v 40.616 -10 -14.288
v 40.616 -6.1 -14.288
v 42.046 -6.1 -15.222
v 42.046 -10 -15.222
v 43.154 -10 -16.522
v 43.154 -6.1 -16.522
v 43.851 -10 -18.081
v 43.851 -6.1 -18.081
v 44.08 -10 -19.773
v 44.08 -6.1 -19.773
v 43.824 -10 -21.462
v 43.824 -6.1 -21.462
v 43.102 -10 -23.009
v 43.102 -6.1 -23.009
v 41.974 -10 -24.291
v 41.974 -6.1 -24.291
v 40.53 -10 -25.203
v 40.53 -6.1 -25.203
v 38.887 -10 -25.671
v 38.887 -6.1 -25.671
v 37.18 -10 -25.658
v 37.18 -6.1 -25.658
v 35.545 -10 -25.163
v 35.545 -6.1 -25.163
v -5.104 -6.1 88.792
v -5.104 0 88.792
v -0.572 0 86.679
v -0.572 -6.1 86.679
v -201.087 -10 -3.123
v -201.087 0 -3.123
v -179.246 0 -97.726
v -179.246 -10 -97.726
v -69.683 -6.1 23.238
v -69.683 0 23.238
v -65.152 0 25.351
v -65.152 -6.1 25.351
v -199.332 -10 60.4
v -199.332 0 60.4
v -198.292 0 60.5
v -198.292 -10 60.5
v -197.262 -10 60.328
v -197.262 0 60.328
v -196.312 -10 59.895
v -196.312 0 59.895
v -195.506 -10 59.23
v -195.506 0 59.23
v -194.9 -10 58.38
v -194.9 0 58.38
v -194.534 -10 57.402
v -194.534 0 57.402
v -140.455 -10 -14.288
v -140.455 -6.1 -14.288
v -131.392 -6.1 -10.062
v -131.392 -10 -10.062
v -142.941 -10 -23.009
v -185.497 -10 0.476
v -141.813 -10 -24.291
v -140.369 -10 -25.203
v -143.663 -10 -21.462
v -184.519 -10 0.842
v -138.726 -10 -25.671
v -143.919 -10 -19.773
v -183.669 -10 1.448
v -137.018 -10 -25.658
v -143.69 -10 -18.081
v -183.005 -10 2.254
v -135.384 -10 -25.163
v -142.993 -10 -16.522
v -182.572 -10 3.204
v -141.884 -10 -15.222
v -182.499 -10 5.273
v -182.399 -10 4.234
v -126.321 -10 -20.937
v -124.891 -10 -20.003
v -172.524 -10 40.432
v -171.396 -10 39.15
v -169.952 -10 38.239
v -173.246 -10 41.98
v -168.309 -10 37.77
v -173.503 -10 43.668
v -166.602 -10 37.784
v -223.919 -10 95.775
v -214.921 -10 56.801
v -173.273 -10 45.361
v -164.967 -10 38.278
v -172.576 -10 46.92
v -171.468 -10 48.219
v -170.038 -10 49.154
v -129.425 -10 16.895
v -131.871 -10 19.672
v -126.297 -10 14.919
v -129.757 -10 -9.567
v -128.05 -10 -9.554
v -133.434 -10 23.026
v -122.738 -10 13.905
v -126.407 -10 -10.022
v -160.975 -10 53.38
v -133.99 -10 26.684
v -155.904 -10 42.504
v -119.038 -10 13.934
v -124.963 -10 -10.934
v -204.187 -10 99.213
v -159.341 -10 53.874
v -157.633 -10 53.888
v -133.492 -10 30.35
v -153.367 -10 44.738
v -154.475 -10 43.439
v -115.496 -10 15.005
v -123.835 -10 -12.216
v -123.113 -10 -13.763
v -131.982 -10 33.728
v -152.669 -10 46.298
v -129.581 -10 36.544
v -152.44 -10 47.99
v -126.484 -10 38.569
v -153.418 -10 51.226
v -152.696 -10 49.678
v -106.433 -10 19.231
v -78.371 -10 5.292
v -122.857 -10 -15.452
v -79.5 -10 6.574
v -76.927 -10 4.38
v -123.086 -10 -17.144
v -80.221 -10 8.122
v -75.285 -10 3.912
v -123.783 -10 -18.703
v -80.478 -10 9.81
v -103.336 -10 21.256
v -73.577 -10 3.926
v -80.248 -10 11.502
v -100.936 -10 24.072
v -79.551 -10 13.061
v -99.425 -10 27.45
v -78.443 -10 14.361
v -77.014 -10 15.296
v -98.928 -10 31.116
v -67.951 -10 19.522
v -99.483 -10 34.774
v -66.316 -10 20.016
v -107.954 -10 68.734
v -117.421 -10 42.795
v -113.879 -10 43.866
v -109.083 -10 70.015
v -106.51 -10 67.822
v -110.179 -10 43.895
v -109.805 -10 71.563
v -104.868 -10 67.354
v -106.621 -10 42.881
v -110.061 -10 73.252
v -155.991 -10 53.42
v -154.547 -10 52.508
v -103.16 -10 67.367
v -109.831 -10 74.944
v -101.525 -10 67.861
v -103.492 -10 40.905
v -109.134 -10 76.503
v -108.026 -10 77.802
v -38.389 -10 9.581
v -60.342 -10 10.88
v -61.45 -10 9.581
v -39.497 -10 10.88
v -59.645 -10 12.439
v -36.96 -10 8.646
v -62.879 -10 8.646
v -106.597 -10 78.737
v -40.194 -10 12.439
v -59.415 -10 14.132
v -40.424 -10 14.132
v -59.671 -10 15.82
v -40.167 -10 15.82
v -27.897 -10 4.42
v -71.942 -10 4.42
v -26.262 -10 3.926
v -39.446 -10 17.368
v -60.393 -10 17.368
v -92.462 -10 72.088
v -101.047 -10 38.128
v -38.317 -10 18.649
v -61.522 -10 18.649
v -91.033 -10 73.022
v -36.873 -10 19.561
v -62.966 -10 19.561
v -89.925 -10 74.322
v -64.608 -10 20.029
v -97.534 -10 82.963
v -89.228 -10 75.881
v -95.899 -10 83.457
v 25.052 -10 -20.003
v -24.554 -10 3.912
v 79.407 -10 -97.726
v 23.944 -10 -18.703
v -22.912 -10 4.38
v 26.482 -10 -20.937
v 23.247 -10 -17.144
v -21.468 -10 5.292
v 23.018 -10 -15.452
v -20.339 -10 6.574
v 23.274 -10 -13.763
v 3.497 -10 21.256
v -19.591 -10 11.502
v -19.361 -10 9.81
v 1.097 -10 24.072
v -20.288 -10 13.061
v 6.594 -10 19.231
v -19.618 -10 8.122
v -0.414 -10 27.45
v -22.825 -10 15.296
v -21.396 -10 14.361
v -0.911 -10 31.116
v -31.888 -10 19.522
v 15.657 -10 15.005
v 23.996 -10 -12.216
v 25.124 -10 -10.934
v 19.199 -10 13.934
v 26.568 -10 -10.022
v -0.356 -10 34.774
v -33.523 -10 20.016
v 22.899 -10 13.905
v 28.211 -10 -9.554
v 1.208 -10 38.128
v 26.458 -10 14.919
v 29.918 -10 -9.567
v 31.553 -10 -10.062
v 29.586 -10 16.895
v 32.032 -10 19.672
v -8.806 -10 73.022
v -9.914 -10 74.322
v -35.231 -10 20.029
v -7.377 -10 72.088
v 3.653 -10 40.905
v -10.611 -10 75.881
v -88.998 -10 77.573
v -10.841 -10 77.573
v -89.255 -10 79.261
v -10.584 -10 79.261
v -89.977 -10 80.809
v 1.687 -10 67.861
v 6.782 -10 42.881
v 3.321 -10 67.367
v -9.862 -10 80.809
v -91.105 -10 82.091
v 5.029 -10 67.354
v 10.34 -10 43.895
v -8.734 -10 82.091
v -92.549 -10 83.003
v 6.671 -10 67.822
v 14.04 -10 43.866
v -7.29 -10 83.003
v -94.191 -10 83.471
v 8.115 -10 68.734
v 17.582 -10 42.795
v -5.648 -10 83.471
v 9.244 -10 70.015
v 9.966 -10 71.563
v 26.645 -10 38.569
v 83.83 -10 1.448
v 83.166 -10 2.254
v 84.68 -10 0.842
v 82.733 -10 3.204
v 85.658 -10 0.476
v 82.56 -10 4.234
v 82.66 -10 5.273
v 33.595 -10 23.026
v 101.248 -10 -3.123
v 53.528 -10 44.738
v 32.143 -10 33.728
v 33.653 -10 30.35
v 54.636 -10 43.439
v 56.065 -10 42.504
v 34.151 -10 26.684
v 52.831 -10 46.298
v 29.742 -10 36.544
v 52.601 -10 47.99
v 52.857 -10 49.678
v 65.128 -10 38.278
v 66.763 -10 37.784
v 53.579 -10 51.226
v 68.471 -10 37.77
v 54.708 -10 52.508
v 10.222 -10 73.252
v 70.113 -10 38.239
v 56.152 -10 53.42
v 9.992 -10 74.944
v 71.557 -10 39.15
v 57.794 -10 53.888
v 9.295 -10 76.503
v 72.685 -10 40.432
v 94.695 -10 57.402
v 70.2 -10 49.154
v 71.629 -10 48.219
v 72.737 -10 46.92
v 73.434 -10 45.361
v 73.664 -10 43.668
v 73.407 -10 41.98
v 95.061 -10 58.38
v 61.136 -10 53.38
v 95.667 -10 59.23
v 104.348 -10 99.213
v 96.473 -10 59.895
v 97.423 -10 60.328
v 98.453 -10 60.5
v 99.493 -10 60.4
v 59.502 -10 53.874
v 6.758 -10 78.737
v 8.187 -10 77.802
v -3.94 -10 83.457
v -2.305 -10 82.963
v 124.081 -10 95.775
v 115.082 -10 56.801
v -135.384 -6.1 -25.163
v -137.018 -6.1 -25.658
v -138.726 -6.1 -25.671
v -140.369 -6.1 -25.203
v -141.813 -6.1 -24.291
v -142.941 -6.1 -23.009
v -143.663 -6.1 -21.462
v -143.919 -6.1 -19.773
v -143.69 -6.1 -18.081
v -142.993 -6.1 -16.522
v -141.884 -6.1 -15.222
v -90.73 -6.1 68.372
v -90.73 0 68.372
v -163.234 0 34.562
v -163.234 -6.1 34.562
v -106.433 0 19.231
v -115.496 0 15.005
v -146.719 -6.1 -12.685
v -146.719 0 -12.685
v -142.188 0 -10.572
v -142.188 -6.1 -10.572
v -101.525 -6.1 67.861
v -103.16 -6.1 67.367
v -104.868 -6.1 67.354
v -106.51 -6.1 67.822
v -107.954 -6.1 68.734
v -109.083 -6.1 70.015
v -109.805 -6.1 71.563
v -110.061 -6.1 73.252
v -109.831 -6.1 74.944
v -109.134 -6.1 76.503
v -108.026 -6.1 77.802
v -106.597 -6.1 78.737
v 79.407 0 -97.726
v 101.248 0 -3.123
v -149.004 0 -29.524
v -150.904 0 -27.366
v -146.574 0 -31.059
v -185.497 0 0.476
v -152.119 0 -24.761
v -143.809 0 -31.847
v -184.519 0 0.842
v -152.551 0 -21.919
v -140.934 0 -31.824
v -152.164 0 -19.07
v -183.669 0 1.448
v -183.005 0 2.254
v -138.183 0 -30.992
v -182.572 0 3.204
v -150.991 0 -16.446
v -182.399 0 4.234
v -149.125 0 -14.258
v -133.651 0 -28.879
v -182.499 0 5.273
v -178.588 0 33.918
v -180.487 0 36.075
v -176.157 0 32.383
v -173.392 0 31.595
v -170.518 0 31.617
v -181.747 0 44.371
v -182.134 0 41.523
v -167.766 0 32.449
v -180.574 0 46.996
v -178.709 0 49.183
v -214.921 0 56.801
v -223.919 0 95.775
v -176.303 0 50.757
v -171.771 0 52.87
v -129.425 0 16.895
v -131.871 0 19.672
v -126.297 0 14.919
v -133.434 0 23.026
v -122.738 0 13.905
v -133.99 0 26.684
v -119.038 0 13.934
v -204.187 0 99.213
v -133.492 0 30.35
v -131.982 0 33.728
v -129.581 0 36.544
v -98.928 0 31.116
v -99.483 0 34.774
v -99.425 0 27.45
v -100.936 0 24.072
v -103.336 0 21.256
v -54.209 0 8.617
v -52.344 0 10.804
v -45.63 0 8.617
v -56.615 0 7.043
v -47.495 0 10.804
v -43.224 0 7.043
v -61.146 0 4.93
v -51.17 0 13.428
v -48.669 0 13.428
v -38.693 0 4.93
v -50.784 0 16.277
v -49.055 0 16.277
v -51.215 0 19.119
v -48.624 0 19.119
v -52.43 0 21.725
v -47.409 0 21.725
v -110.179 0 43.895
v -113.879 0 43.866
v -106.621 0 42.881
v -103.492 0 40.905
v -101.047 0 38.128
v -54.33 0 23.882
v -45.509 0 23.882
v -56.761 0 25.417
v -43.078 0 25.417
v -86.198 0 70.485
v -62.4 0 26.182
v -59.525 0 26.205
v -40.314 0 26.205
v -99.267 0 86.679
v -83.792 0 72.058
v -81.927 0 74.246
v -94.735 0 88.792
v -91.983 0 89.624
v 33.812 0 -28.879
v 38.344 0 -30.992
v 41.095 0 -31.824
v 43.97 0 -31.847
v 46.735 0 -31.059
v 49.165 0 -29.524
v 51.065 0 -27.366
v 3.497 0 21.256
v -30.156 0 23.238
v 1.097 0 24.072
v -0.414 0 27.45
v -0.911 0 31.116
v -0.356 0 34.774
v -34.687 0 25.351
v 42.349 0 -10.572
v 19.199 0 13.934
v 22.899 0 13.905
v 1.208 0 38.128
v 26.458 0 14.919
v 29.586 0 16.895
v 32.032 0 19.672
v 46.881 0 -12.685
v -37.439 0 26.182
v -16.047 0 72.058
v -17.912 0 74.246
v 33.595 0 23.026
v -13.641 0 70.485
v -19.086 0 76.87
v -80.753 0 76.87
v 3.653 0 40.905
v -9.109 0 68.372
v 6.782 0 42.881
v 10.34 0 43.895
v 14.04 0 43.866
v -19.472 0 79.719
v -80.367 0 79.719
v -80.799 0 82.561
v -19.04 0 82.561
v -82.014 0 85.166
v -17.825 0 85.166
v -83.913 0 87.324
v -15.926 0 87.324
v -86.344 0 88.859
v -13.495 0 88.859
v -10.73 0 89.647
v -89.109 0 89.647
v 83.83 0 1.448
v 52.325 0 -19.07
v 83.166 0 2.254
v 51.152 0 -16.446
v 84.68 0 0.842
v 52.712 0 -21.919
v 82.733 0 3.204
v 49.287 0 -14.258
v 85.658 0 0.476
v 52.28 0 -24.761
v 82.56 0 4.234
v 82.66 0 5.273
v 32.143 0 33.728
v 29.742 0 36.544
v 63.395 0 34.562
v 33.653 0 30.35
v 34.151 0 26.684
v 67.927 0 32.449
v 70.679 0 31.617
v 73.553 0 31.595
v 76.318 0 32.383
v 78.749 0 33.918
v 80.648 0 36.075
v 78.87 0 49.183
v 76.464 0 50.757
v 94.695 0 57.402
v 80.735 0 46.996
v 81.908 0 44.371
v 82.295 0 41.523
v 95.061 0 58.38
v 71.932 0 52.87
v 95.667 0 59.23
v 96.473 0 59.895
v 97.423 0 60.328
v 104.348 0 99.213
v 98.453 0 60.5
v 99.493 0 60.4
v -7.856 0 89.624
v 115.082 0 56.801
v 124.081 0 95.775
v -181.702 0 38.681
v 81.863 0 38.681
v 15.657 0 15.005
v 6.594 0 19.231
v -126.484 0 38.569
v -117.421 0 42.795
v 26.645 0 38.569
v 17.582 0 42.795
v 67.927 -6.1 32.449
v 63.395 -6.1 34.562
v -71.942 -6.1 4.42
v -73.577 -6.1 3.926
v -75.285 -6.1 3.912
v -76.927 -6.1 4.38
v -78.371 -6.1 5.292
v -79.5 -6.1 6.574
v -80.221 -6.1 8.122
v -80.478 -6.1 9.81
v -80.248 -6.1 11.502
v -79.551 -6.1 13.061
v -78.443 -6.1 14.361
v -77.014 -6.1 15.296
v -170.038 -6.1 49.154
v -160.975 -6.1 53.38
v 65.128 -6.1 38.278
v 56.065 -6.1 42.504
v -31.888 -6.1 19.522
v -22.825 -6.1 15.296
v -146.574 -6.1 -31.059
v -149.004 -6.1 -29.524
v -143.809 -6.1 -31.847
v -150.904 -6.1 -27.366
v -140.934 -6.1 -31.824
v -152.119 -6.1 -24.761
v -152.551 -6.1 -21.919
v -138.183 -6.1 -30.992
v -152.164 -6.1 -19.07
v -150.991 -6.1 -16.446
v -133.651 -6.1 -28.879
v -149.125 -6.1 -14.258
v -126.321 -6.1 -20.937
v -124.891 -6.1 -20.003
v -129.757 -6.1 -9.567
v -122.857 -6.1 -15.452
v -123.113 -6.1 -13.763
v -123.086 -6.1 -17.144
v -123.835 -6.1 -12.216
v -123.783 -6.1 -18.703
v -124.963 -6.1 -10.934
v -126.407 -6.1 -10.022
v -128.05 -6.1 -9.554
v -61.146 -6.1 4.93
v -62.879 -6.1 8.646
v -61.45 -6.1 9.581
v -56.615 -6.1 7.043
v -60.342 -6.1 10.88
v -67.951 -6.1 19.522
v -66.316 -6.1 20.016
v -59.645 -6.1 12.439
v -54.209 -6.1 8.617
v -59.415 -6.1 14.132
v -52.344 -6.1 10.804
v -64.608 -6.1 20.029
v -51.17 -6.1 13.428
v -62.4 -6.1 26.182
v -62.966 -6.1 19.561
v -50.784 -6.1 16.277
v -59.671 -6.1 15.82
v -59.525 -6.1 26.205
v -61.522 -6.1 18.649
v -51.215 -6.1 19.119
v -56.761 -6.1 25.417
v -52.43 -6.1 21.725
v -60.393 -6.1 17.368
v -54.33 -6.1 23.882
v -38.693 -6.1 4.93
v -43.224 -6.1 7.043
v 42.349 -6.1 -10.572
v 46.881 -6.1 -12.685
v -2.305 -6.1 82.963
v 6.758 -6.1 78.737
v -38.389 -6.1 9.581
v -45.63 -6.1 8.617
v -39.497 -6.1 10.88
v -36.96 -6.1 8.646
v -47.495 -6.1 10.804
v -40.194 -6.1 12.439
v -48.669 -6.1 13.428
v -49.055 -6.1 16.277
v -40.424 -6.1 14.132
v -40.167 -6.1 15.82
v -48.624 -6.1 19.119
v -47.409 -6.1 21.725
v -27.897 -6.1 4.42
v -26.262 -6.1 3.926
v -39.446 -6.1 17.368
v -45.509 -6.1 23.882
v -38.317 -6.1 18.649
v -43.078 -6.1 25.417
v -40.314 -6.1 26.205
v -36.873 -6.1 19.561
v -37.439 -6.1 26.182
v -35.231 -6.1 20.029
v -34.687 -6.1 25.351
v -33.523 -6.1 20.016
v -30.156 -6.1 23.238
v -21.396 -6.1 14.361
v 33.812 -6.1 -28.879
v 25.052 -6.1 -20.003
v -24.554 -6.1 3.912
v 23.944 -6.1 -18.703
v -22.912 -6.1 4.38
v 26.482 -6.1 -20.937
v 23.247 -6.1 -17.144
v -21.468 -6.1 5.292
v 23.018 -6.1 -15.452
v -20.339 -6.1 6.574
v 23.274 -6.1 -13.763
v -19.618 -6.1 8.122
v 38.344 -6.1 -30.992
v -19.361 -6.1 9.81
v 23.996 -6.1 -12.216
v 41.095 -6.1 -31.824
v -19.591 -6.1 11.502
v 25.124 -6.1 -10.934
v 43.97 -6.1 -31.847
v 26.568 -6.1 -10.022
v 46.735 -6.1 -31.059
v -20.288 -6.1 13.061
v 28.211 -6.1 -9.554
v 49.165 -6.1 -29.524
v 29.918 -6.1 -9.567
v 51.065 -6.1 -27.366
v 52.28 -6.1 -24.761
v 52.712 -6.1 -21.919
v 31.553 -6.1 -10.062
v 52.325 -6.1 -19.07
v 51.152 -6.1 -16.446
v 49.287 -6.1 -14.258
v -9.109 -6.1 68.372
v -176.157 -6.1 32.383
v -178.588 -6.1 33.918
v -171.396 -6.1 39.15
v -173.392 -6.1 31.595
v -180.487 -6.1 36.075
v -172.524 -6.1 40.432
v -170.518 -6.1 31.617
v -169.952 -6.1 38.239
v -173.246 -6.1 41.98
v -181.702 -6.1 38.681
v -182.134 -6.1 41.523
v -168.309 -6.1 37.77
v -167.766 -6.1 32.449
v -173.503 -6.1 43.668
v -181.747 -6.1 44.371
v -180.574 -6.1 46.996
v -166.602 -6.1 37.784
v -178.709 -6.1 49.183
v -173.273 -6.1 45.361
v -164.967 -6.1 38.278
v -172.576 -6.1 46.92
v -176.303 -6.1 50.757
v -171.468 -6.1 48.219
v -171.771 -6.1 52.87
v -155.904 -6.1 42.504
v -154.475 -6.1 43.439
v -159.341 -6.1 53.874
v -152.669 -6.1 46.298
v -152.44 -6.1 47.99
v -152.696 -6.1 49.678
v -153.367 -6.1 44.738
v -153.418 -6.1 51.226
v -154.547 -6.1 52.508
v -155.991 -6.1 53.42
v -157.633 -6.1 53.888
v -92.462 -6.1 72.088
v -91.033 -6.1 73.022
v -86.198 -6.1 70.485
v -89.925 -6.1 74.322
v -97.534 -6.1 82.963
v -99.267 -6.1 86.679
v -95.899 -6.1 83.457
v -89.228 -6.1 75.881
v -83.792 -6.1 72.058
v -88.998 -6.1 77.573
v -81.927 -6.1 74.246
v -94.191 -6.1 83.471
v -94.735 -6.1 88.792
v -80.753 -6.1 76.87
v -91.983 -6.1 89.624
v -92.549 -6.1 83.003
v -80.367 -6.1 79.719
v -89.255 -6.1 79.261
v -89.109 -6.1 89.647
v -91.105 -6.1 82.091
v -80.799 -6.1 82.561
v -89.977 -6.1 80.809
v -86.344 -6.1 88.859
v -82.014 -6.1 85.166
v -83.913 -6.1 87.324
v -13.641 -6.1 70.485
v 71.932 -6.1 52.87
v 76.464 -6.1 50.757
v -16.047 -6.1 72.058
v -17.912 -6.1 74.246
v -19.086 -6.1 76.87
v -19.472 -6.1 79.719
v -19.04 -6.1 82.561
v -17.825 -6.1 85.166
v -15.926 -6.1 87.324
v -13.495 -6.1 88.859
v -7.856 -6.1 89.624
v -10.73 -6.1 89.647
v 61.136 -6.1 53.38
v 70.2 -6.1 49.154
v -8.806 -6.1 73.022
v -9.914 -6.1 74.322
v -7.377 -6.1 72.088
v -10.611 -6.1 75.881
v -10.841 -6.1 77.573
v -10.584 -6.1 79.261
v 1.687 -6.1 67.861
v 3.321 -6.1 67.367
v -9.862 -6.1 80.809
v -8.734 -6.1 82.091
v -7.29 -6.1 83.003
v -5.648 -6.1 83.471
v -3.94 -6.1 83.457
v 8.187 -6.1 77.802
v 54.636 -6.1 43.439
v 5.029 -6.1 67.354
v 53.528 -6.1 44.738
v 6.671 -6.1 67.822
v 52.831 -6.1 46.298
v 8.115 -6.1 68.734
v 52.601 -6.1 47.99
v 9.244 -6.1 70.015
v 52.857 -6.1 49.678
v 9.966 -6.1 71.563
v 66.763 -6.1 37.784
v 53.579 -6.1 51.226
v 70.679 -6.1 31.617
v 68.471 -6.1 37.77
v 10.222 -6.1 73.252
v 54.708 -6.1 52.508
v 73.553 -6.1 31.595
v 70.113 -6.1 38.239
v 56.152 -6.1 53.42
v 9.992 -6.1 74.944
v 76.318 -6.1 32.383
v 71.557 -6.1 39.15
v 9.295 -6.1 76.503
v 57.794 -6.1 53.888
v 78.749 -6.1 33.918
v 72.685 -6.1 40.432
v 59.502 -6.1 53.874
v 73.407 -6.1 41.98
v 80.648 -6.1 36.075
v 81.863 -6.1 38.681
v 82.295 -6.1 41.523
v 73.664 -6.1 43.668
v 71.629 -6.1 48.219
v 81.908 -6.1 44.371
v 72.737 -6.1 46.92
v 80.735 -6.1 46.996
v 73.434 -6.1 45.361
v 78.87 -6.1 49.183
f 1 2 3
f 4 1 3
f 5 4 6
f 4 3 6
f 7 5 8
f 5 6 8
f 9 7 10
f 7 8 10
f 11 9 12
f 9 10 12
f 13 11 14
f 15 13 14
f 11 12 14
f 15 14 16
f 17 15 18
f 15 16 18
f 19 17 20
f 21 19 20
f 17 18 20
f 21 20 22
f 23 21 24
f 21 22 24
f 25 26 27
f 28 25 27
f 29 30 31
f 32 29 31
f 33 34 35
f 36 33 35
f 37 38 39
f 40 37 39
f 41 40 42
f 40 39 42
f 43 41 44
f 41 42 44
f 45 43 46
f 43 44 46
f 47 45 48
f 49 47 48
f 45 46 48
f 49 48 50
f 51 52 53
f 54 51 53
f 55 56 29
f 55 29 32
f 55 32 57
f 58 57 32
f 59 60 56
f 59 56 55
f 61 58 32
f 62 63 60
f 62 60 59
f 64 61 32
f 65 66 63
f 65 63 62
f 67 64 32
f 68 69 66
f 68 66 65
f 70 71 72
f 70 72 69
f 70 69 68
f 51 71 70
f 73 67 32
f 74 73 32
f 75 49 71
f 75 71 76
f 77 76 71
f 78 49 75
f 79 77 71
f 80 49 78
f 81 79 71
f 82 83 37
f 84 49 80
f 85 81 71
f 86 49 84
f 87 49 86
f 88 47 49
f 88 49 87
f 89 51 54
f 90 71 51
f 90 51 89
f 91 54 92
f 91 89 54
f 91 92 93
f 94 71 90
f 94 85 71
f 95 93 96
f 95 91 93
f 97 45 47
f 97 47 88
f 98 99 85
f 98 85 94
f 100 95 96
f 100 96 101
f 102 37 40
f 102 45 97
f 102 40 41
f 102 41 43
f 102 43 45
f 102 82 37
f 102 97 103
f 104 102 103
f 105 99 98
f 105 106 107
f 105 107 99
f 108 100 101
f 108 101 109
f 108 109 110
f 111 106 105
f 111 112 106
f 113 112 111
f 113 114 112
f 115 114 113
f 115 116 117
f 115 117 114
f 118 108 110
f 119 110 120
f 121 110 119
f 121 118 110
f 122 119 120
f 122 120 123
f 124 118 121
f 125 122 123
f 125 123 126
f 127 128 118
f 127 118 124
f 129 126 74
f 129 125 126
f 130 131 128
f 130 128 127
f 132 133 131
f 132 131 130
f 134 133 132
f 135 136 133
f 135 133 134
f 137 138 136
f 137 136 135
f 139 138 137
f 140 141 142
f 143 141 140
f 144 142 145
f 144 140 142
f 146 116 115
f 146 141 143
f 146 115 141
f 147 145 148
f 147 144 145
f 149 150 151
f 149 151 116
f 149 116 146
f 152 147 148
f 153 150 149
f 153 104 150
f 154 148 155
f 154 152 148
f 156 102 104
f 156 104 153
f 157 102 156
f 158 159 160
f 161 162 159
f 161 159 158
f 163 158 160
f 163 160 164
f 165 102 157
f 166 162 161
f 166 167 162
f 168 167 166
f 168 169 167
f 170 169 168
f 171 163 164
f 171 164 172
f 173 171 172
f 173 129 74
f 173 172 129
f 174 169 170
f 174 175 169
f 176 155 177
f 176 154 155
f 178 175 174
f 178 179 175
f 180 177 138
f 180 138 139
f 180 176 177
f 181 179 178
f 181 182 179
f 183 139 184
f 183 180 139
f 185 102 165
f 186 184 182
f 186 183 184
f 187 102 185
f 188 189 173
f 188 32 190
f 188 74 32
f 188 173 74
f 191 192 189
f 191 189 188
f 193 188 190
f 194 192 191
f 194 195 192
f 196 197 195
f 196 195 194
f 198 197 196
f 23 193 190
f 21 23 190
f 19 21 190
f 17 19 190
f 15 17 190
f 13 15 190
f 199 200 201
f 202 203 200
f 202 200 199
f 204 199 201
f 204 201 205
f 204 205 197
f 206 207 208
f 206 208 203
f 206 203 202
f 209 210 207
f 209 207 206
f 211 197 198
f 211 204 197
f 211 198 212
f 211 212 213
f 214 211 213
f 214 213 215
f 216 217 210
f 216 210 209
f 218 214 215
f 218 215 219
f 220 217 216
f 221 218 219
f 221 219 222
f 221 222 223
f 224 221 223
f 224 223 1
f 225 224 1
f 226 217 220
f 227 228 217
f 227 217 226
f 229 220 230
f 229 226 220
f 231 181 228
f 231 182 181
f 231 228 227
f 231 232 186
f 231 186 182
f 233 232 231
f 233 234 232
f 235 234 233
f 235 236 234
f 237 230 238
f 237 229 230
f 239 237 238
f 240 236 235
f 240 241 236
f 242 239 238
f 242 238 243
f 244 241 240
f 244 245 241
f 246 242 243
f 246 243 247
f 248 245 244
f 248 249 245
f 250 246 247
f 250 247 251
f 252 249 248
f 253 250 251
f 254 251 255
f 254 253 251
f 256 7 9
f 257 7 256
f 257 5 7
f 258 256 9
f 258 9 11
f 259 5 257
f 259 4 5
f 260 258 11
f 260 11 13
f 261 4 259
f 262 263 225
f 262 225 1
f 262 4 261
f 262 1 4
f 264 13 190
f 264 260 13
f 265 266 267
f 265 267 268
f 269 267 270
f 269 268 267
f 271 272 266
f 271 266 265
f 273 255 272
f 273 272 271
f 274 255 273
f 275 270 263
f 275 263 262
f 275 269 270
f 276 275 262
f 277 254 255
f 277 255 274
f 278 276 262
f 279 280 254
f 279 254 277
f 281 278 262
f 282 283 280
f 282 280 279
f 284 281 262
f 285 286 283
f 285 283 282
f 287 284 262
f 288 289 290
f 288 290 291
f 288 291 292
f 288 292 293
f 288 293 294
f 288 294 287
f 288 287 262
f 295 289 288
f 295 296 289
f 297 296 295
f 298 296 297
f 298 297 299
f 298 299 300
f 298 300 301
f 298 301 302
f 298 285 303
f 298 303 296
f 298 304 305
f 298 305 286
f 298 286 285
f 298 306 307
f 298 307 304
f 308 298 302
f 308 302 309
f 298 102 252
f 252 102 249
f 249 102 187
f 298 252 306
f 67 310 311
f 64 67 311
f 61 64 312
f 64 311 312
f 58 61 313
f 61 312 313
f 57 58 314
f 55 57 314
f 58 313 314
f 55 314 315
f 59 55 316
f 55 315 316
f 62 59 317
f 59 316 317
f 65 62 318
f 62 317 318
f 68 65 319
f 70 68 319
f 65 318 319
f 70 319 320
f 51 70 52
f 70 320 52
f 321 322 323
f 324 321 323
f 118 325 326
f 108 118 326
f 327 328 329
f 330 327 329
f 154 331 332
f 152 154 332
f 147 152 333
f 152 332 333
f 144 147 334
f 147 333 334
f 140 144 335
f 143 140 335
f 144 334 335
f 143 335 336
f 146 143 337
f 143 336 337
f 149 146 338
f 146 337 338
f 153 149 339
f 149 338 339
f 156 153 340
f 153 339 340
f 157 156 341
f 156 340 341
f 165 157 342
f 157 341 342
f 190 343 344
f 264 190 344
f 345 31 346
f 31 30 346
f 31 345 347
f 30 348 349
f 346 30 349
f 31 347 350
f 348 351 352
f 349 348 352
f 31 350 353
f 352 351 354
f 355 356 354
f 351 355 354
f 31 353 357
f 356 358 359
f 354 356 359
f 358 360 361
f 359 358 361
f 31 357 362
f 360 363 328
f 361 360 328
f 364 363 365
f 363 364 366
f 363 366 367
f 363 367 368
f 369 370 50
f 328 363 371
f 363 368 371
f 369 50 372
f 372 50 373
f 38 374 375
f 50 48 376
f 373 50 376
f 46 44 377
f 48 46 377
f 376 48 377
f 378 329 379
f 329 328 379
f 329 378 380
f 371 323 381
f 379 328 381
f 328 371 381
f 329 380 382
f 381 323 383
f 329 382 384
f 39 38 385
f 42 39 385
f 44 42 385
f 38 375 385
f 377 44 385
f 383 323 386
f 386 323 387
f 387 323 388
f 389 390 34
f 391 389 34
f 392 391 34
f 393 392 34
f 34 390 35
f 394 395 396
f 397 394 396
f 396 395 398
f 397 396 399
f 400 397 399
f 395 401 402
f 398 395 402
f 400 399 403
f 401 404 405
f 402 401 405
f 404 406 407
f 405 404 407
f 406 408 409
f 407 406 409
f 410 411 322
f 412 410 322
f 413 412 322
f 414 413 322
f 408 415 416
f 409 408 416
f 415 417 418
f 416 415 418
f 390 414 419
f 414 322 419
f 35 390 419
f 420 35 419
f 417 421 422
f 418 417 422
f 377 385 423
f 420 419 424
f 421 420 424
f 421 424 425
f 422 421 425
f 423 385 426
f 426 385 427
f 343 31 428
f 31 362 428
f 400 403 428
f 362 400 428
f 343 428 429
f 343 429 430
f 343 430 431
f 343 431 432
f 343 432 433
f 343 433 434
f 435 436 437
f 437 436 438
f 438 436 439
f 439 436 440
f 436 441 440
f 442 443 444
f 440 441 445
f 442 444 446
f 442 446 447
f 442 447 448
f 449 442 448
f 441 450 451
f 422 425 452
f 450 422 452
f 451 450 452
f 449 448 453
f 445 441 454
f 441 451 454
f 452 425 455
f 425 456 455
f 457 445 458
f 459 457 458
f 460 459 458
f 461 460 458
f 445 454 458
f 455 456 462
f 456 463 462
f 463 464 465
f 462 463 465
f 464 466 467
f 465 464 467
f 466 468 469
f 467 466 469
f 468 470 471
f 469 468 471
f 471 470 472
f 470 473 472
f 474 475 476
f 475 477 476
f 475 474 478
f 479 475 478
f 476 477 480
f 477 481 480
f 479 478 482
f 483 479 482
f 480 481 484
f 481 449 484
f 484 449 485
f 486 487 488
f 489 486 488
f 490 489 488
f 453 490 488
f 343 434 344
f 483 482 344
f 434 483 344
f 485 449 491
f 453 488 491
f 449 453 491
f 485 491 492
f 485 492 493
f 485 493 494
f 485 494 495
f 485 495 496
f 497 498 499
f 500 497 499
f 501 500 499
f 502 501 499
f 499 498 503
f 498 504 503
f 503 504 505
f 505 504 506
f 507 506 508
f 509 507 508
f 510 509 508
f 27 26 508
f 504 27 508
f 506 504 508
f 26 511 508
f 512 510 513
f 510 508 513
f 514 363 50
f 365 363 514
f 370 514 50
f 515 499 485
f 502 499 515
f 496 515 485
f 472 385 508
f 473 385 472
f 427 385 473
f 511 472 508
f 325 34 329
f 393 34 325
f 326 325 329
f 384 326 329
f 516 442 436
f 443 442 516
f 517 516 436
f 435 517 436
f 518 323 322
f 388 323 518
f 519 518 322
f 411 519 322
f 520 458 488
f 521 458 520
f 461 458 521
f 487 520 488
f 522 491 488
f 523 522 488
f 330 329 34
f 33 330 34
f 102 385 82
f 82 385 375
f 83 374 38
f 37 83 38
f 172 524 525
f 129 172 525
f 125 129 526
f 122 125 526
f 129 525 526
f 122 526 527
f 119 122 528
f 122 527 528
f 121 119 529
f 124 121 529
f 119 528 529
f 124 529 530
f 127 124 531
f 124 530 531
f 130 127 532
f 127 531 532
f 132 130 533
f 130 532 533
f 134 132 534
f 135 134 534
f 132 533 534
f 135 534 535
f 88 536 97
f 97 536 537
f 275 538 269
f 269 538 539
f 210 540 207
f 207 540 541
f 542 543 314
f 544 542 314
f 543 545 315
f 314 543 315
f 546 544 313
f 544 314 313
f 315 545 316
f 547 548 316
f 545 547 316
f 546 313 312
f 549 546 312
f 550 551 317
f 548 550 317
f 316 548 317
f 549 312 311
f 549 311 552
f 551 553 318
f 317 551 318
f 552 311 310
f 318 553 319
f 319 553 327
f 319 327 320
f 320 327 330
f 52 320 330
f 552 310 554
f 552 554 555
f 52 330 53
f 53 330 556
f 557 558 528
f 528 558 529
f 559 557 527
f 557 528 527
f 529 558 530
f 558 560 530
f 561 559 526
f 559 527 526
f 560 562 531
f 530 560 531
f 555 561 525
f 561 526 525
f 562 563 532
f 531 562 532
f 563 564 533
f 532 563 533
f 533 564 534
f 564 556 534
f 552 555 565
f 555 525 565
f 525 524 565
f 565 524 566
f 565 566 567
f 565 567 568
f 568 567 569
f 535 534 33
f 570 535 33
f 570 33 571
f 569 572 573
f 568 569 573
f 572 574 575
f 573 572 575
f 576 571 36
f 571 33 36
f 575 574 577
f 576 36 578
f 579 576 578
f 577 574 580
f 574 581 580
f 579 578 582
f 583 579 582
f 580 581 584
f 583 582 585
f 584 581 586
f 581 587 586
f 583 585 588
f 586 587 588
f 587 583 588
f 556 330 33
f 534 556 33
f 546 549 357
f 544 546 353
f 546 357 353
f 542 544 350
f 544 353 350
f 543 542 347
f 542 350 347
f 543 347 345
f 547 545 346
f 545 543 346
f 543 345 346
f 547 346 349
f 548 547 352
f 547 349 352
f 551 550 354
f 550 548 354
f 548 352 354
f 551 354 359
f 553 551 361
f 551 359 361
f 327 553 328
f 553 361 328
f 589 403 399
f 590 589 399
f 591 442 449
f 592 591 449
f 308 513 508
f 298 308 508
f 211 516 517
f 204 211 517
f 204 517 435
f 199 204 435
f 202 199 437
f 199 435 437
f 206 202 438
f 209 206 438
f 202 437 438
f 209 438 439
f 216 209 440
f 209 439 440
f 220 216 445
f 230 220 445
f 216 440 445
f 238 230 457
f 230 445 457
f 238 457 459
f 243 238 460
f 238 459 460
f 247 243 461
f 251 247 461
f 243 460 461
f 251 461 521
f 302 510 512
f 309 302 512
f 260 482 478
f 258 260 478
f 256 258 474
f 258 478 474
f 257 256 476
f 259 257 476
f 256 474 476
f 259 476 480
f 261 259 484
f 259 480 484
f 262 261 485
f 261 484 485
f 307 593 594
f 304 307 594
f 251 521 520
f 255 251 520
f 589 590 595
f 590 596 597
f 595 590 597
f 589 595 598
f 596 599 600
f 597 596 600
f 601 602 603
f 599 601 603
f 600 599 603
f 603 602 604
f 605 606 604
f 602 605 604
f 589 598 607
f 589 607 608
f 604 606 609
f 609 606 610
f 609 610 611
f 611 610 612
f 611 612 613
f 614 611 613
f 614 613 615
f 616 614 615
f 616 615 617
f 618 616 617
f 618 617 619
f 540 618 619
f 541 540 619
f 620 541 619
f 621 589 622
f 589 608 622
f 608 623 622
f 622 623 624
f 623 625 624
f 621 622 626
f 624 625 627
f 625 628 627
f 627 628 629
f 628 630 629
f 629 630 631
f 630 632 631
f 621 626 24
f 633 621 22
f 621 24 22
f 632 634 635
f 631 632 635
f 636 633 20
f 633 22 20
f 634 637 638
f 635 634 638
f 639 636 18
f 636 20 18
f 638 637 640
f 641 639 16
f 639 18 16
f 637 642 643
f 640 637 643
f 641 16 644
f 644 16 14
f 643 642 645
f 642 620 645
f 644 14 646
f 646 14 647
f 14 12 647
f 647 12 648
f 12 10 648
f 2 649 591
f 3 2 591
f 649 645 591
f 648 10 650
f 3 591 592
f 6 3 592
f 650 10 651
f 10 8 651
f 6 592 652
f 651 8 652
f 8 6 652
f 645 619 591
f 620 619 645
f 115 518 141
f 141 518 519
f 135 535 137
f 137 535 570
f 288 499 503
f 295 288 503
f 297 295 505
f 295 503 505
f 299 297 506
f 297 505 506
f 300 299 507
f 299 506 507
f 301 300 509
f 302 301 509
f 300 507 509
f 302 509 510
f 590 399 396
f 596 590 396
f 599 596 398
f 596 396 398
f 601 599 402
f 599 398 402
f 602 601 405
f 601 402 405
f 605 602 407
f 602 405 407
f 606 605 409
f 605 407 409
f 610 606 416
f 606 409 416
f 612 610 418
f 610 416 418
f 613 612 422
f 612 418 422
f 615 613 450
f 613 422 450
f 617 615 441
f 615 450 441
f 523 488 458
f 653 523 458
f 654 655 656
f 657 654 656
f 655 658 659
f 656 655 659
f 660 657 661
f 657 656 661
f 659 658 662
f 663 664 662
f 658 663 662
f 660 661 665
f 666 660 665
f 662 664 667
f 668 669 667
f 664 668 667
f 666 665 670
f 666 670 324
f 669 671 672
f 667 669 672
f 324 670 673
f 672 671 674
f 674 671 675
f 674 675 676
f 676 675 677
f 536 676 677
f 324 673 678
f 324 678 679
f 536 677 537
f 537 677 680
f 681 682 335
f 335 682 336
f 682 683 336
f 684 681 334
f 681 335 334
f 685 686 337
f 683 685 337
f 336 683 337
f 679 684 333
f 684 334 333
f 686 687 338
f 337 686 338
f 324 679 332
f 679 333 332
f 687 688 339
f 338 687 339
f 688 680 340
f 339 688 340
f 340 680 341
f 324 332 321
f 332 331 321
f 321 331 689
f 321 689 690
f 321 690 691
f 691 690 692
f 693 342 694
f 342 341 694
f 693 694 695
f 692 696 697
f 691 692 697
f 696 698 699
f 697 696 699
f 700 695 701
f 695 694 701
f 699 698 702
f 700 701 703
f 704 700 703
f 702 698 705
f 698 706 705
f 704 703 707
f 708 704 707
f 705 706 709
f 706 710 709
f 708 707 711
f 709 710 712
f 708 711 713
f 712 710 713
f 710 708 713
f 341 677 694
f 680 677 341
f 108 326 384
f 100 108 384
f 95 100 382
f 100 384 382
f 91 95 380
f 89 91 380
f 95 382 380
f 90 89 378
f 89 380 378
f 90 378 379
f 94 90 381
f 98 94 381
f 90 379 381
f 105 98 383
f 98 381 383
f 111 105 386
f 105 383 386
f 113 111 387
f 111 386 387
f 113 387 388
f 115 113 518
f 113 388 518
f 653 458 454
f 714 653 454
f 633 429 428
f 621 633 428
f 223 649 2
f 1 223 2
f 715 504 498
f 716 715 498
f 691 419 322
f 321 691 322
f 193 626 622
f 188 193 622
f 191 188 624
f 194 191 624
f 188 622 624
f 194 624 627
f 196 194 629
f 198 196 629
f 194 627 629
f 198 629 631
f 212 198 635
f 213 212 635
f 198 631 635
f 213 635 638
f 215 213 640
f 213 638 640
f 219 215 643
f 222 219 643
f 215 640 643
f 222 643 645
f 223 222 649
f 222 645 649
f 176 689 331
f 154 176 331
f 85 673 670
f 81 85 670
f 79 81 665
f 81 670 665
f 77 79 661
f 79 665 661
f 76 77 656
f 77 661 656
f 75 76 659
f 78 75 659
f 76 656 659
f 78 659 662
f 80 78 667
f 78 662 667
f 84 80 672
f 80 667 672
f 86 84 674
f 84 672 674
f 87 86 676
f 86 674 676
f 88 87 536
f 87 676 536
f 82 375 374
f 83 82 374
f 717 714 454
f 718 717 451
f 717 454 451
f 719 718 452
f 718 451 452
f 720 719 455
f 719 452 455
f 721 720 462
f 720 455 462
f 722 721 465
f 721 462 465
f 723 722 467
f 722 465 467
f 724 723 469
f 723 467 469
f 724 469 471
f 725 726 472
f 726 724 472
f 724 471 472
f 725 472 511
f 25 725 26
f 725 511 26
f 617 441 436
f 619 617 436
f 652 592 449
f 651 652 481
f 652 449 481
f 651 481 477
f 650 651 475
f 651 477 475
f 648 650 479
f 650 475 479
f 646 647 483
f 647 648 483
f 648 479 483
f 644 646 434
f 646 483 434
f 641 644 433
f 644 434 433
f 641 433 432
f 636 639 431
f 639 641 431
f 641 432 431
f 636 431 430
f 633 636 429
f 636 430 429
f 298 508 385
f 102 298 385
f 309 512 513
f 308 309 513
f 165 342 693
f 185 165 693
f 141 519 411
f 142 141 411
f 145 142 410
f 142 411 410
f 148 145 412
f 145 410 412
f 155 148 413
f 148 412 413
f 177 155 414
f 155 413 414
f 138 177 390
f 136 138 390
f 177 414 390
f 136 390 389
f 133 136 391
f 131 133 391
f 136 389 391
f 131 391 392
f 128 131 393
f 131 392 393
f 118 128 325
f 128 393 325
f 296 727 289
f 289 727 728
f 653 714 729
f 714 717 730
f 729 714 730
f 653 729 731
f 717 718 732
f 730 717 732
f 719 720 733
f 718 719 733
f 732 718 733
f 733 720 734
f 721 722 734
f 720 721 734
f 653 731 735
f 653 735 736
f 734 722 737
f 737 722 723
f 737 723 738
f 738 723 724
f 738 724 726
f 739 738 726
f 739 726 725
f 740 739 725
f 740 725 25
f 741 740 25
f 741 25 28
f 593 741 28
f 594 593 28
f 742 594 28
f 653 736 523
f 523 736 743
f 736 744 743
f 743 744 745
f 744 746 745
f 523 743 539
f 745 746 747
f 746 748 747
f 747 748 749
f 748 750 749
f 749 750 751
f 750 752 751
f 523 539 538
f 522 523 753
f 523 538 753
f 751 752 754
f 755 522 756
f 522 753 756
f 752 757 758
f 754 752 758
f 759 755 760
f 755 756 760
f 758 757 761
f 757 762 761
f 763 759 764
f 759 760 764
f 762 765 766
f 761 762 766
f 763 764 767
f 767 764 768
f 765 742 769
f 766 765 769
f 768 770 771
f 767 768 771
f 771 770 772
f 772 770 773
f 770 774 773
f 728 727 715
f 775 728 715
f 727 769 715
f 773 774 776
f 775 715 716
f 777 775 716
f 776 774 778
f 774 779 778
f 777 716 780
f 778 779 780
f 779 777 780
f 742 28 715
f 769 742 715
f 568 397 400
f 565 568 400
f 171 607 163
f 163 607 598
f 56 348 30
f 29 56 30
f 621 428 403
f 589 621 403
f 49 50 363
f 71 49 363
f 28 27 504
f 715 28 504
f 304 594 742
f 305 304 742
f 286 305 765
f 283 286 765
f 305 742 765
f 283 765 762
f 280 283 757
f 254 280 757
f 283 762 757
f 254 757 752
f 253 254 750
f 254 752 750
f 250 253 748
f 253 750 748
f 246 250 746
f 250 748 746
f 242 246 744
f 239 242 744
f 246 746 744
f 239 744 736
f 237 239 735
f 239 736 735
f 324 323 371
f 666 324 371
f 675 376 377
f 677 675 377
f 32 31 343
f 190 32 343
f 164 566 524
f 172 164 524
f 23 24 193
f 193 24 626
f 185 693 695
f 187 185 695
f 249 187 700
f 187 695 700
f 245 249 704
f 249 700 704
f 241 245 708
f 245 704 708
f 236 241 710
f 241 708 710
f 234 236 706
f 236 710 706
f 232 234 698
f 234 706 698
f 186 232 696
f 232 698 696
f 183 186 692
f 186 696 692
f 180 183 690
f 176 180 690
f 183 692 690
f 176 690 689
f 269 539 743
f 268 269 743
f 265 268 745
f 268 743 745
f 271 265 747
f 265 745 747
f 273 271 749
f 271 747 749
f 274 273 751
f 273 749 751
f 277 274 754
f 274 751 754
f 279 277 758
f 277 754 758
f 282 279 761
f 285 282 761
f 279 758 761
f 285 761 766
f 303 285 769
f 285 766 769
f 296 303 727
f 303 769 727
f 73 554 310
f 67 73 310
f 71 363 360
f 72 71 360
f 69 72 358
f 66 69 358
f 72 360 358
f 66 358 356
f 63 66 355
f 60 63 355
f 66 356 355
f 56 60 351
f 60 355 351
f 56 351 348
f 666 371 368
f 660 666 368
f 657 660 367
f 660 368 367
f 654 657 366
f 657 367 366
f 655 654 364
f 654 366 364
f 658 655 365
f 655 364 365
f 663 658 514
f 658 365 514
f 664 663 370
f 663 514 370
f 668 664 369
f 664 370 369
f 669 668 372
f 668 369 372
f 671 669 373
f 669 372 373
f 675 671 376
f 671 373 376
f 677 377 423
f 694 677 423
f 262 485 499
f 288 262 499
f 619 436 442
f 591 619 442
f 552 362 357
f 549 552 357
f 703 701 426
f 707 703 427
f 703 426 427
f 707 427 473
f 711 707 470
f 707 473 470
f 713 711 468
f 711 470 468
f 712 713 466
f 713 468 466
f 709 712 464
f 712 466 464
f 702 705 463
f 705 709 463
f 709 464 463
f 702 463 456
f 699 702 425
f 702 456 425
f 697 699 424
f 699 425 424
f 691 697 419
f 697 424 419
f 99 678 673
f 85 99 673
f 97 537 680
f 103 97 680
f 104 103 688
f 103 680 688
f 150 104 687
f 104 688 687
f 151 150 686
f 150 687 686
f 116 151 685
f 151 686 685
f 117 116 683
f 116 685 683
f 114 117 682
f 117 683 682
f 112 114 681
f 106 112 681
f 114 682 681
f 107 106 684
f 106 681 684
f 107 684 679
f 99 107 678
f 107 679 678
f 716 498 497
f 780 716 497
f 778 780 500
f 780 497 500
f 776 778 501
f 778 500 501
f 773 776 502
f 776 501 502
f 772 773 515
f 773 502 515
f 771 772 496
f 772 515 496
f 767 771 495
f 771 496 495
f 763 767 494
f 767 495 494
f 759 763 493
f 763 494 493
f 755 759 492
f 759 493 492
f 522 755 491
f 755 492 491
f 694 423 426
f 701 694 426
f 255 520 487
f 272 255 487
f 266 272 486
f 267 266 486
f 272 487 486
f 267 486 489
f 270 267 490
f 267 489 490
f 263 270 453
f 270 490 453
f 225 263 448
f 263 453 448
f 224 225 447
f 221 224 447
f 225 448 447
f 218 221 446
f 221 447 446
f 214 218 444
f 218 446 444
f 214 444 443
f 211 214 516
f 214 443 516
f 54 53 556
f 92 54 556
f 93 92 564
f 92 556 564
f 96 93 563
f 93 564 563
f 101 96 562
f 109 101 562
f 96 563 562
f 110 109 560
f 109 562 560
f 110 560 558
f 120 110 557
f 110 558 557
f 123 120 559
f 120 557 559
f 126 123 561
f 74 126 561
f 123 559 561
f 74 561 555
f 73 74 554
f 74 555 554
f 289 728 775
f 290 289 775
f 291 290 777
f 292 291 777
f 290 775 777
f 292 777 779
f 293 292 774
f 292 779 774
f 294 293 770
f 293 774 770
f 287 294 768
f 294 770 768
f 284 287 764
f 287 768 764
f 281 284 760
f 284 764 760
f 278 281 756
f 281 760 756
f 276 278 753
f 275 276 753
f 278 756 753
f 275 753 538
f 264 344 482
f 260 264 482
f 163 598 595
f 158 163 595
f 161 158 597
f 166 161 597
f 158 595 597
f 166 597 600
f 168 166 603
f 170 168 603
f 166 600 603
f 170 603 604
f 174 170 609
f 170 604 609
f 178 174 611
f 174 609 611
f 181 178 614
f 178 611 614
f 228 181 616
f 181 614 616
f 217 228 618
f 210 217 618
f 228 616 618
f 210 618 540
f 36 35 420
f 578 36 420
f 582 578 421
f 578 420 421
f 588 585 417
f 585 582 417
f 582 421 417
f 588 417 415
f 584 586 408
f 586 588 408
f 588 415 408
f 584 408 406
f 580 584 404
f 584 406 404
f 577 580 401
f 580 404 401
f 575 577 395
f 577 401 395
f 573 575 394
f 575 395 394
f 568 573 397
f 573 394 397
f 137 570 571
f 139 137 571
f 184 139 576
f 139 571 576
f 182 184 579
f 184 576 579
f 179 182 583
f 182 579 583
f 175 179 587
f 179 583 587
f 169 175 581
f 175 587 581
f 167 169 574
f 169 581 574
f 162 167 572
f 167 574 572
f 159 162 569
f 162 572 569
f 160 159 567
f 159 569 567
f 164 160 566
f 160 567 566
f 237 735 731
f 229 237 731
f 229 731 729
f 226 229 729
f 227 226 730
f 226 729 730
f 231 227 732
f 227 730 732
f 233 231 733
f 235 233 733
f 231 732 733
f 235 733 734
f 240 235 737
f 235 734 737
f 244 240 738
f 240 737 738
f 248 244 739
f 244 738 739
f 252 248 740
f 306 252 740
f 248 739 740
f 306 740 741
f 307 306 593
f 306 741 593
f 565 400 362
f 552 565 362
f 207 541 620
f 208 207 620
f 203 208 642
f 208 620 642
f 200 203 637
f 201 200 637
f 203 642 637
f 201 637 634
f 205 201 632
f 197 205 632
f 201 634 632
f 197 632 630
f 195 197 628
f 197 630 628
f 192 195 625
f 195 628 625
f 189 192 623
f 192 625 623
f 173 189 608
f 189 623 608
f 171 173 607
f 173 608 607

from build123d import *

# Parameters (mm, degrees)
F1_DEPTH = 10
F2_START = 6.1
F2_DEPTH = 3.9


with BuildPart() as f1:
    # F0 (on Front) → F1 (new body)
    with BuildSketch(Plane.XZ):
        with BuildLine():
            Line((-10.0713614853, 99.2132068528), (-89.767584656, 99.2132068528))
            Line((-89.767584656, 99.2132068528), (-204.1870618351, 99.2132068528))
            Line((-204.1870618351, 99.2132068528), (-223.9194730707, 95.7754404094))
            Line((-223.9194730707, 95.7754404094), (-214.9214308969, 56.800637818))
            Line((-214.9214308969, 56.800637818), (-199.3315098604, 60.3998546875))
            ThreePointArc((-199.3315098604, 60.3998546875), (-196.3120285861, 59.8945668129), (-194.5342253839, 57.4021786457))
            Line((-194.5342253839, 57.4021786457), (-182.4993439765, 5.2733801797))
            ThreePointArc((-182.4993439765, 5.2733801797), (-183.004631851, 2.2538989054), (-185.4970200182, 0.4760957032))
            Line((-185.4970200182, 0.4760957032), (-201.0869410548, -3.1231211663))
            Line((-201.0869410548, -3.1231211663), (-179.246252088, -97.7255385038))
            Line((-179.246252088, -97.7255385038), (-49.9194730707, -97.7255385038))
            Line((-49.9194730707, -97.7255385038), (79.4073059466, -97.7255385038))
            Line((79.4073059466, -97.7255385038), (101.2479949134, -3.1231211663))
            Line((101.2479949134, -3.1231211663), (85.6580738768, 0.4760957032))
            ThreePointArc((85.6580738768, 0.4760957032), (83.1656857096, 2.2538989054), (82.6603978351, 5.2733801797))
            Line((82.6603978351, 5.2733801797), (94.6952792425, 57.4021786457))
            ThreePointArc((94.6952792425, 57.4021786457), (96.4730824447, 59.8945668129), (99.492563719, 60.3998546875))
            Line((99.492563719, 60.3998546875), (115.0824847556, 56.800637818))
            Line((115.0824847556, 56.800637818), (124.0805269293, 95.7754404094))
            Line((124.0805269293, 95.7754404094), (104.3481156937, 99.2132068528))
            Line((104.3481156937, 99.2132068528), (-10.0713614853, 99.2132068528))
        make_face()
        with BuildLine():
            Line((-146.7194564495, -12.6849211634), (-142.1879175143, -10.5718298547))
            Line((-142.1879175143, -10.5718298547), (-69.6832945513, 23.2376310846))
            Line((-69.6832945513, 23.2376310846), (-65.1517556162, 25.3507223933))
            ThreePointArc((-65.1517556162, 25.3507223933), (-51.7296025235, 20.4654581878), (-56.614866729, 7.0433050951))
            Line((-56.614866729, 7.0433050951), (-61.1464056642, 4.9302137864))
            Line((-61.1464056642, 4.9302137864), (-133.6510286271, -28.8792471528))
            Line((-133.6510286271, -28.8792471528), (-138.1825675623, -30.9923384615))
            ThreePointArc((-138.1825675623, -30.9923384615), (-151.6047206549, -26.107074256), (-146.7194564495, -12.6849211634))
        make_face(mode=Mode.SUBTRACT)
        with BuildLine():
            Line((38.3436214209, -30.9923384615), (33.8120824857, -28.8792471528))
            Line((33.8120824857, -28.8792471528), (-38.6925404772, 4.9302137864))
            Line((-38.6925404772, 4.9302137864), (-43.2240794124, 7.0433050951))
            ThreePointArc((-43.2240794124, 7.0433050951), (-48.1093436179, 20.4654581878), (-34.6871905252, 25.3507223933))
            Line((-34.6871905252, 25.3507223933), (-30.15565159, 23.2376310846))
            Line((-30.15565159, 23.2376310846), (42.3489713729, -10.5718298547))
            Line((42.3489713729, -10.5718298547), (46.8805103081, -12.6849211634))
            ThreePointArc((46.8805103081, -12.6849211634), (51.7657745136, -26.107074256), (38.3436214209, -30.9923384615))
        make_face(mode=Mode.SUBTRACT)
        with BuildLine():
            ThreePointArc((-115.4963022827, 15.004871972), (-132.7723409168, 21.2928358008), (-126.484377088, 38.5688744349))
            Line((-126.484377088, 38.5688744349), (-117.4212992176, 42.7950570523))
            ThreePointArc((-117.4212992176, 42.7950570523), (-100.1452605835, 36.5070932235), (-106.4332244123, 19.2310545894))
            Line((-106.4332244123, 19.2310545894), (-115.4963022827, 15.004871972))
        make_face(mode=Mode.SUBTRACT)
        with BuildLine():
            Line((-90.729683986, 68.371758879), (-163.234306949, 34.5622979397))
            Line((-163.234306949, 34.5622979397), (-167.7658458841, 32.449206631))
            ThreePointArc((-167.7658458841, 32.449206631), (-181.1879989768, 37.3344708365), (-176.3027347713, 50.7566239292))
            Line((-176.3027347713, 50.7566239292), (-171.7711958361, 52.8697152379))
            Line((-171.7711958361, 52.8697152379), (-99.2665728732, 86.6791761771))
            Line((-99.2665728732, 86.6791761771), (-94.735033938, 88.7922674858))
            ThreePointArc((-94.735033938, 88.7922674858), (-81.3128808454, 83.9070032804), (-86.1981450508, 70.4848501877))
            Line((-86.1981450508, 70.4848501877), (-90.729683986, 68.371758879))
        make_face(mode=Mode.SUBTRACT)
        with BuildLine():
            ThreePointArc((26.6454309466, 38.5688744349), (32.9333947754, 21.2928358008), (15.6573561413, 15.004871972))
            Line((15.6573561413, 15.004871972), (6.594278271, 19.2310545894))
            ThreePointArc((6.594278271, 19.2310545894), (0.3063144421, 36.5070932235), (17.5823530762, 42.7950570523))
            Line((17.5823530762, 42.7950570523), (26.6454309466, 38.5688744349))
        make_face(mode=Mode.SUBTRACT)
        with BuildLine():
            Line((-0.5723732682, 86.6791761771), (71.9322496947, 52.8697152379))
            Line((71.9322496947, 52.8697152379), (76.4637886299, 50.7566239292))
            ThreePointArc((76.4637886299, 50.7566239292), (81.3490528354, 37.3344708365), (67.9268997428, 32.449206631))
            Line((67.9268997428, 32.449206631), (63.3953608076, 34.5622979397))
            Line((63.3953608076, 34.5622979397), (-9.1092621554, 68.371758879))
            Line((-9.1092621554, 68.371758879), (-13.6408010905, 70.4848501877))
            ThreePointArc((-13.6408010905, 70.4848501877), (-18.526065296, 83.9070032804), (-5.1039122034, 88.7922674858))
            Line((-5.1039122034, 88.7922674858), (-0.5723732682, 86.6791761771))
        make_face(mode=Mode.SUBTRACT)
    extrude(amount=F1_DEPTH)

    # F0 (on Front) → F2 (join)
    with BuildSketch(Plane.XZ.offset(F2_START)):
        with BuildLine():
            Line((-167.7658458841, 32.449206631), (-163.234306949, 34.5622979397))
            Line((-163.234306949, 34.5622979397), (-90.729683986, 68.371758879))
            Line((-90.729683986, 68.371758879), (-86.1981450508, 70.4848501877))
            ThreePointArc((-86.1981450508, 70.4848501877), (-81.3128808454, 83.9070032804), (-94.735033938, 88.7922674858))
            Line((-94.735033938, 88.7922674858), (-99.2665728732, 86.6791761771))
            Line((-99.2665728732, 86.6791761771), (-171.7711958361, 52.8697152379))
            Line((-171.7711958361, 52.8697152379), (-176.3027347713, 50.7566239292))
            ThreePointArc((-176.3027347713, 50.7566239292), (-181.1879989768, 37.3344708365), (-167.7658458841, 32.449206631))
        make_face()
        with BuildLine():
            Line((-155.9039639517, 42.504342484), (-164.9670418221, 38.2781598666))
            ThreePointArc((-164.9670418221, 38.2781598666), (-172.9405981148, 41.1802970184), (-170.038460963, 49.153853311))
            Line((-170.038460963, 49.153853311), (-160.9753830926, 53.3800359284))
            ThreePointArc((-160.9753830926, 53.3800359284), (-153.0018268, 50.4778987767), (-155.9039639517, 42.504342484))
        make_face(mode=Mode.SUBTRACT)
        with BuildLine():
            ThreePointArc((-97.533838, 82.9633142503), (-89.5602817074, 80.0611770985), (-92.4624188592, 72.0876208058))
            Line((-92.4624188592, 72.0876208058), (-101.5254967295, 67.8614381884))
            ThreePointArc((-101.5254967295, 67.8614381884), (-109.4990530222, 70.7635753402), (-106.5969158704, 78.7371316329))
            Line((-106.5969158704, 78.7371316329), (-97.533838, 82.9633142503))
        make_face(mode=Mode.SUBTRACT)
        with BuildLine():
            Line((76.4637886299, 50.7566239292), (71.9322496947, 52.8697152379))
            Line((71.9322496947, 52.8697152379), (-0.5723732682, 86.6791761771))
            Line((-0.5723732682, 86.6791761771), (-5.1039122034, 88.7922674858))
            ThreePointArc((-5.1039122034, 88.7922674858), (-18.526065296, 83.9070032804), (-13.6408010905, 70.4848501877))
            Line((-13.6408010905, 70.4848501877), (-9.1092621554, 68.371758879))
            Line((-9.1092621554, 68.371758879), (63.3953608076, 34.5622979397))
            Line((63.3953608076, 34.5622979397), (67.9268997428, 32.449206631))
            ThreePointArc((67.9268997428, 32.449206631), (81.3490528354, 37.3344708365), (76.4637886299, 50.7566239292))
        make_face()
        with BuildLine():
            ThreePointArc((70.1995148216, 49.153853311), (73.1016519734, 41.1802970184), (65.1280956807, 38.2781598666))
            Line((65.1280956807, 38.2781598666), (56.0650178103, 42.504342484))
            ThreePointArc((56.0650178103, 42.504342484), (53.1628806586, 50.4778987767), (61.1364369512, 53.3800359284))
            Line((61.1364369512, 53.3800359284), (70.1995148216, 49.153853311))
        make_face(mode=Mode.SUBTRACT)
        with BuildLine():
            ThreePointArc((-7.3765272822, 72.0876208058), (-10.278664434, 80.0611770985), (-2.3051081413, 82.9633142503))
            Line((-2.3051081413, 82.9633142503), (6.757969729, 78.7371316329))
            ThreePointArc((6.757969729, 78.7371316329), (9.6601068808, 70.7635753402), (1.6865505881, 67.8614381884))
            Line((1.6865505881, 67.8614381884), (-7.3765272822, 72.0876208058))
        make_face(mode=Mode.SUBTRACT)
        with BuildLine():
            Line((-69.6832945513, 23.2376310846), (-142.1879175143, -10.5718298547))
            Line((-142.1879175143, -10.5718298547), (-146.7194564495, -12.6849211634))
            ThreePointArc((-146.7194564495, -12.6849211634), (-151.6047206549, -26.107074256), (-138.1825675623, -30.9923384615))
            Line((-138.1825675623, -30.9923384615), (-133.6510286271, -28.8792471528))
            Line((-133.6510286271, -28.8792471528), (-61.1464056642, 4.9302137864))
            Line((-61.1464056642, 4.9302137864), (-56.614866729, 7.0433050951))
            ThreePointArc((-56.614866729, 7.0433050951), (-51.7296025235, 20.4654581878), (-65.1517556162, 25.3507223933))
            Line((-65.1517556162, 25.3507223933), (-69.6832945513, 23.2376310846))
        make_face()
        with BuildLine():
            ThreePointArc((-135.3837635002, -25.163385226), (-143.3573197929, -22.2612480742), (-140.4551826411, -14.2876917815))
            Line((-140.4551826411, -14.2876917815), (-131.3921047708, -10.0615091641))
            ThreePointArc((-131.3921047708, -10.0615091641), (-123.4185484781, -12.9636463159), (-126.3206856299, -20.9372026086))
            Line((-126.3206856299, -20.9372026086), (-135.3837635002, -25.163385226))
        make_face(mode=Mode.SUBTRACT)
        with BuildLine():
            Line((-62.8791405373, 8.6460757133), (-71.9422184077, 4.4198930959))
            ThreePointArc((-71.9422184077, 4.4198930959), (-79.9157747003, 7.3220302477), (-77.0136375486, 15.2955865403))
            Line((-77.0136375486, 15.2955865403), (-67.9505596782, 19.5217691577))
            ThreePointArc((-67.9505596782, 19.5217691577), (-59.9770033855, 16.6196320059), (-62.8791405373, 8.6460757133))
        make_face(mode=Mode.SUBTRACT)
        with BuildLine():
            Line((-38.6925404772, 4.9302137864), (33.8120824857, -28.8792471528))
            Line((33.8120824857, -28.8792471528), (38.3436214209, -30.9923384615))
            ThreePointArc((38.3436214209, -30.9923384615), (51.7657745136, -26.107074256), (46.8805103081, -12.6849211634))
            Line((46.8805103081, -12.6849211634), (42.3489713729, -10.5718298547))
            Line((42.3489713729, -10.5718298547), (-30.15565159, 23.2376310846))
            Line((-30.15565159, 23.2376310846), (-34.6871905252, 25.3507223933))
            ThreePointArc((-34.6871905252, 25.3507223933), (-48.1093436179, 20.4654581878), (-43.2240794124, 7.0433050951))
            Line((-43.2240794124, 7.0433050951), (-38.6925404772, 4.9302137864))
        make_face()
        with BuildLine():
            ThreePointArc((40.6162364998, -14.2876917815), (43.5183736515, -22.2612480742), (35.5448173589, -25.163385226))
            Line((35.5448173589, -25.163385226), (26.4817394885, -20.9372026086))
            ThreePointArc((26.4817394885, -20.9372026086), (23.5796023367, -12.9636463159), (31.5531586294, -10.0615091641))
            Line((31.5531586294, -10.0615091641), (40.6162364998, -14.2876917815))
        make_face(mode=Mode.SUBTRACT)
        with BuildLine():
            ThreePointArc((-36.9598056041, 8.6460757133), (-39.8619427558, 16.6196320059), (-31.8883864632, 19.5217691577))
            Line((-31.8883864632, 19.5217691577), (-22.8253085928, 15.2955865403))
            ThreePointArc((-22.8253085928, 15.2955865403), (-19.923171441, 7.3220302477), (-27.8967277337, 4.4198930959))
            Line((-27.8967277337, 4.4198930959), (-36.9598056041, 8.6460757133))
        make_face(mode=Mode.SUBTRACT)
    extrude(amount=F2_DEPTH)


solid = f1.part
